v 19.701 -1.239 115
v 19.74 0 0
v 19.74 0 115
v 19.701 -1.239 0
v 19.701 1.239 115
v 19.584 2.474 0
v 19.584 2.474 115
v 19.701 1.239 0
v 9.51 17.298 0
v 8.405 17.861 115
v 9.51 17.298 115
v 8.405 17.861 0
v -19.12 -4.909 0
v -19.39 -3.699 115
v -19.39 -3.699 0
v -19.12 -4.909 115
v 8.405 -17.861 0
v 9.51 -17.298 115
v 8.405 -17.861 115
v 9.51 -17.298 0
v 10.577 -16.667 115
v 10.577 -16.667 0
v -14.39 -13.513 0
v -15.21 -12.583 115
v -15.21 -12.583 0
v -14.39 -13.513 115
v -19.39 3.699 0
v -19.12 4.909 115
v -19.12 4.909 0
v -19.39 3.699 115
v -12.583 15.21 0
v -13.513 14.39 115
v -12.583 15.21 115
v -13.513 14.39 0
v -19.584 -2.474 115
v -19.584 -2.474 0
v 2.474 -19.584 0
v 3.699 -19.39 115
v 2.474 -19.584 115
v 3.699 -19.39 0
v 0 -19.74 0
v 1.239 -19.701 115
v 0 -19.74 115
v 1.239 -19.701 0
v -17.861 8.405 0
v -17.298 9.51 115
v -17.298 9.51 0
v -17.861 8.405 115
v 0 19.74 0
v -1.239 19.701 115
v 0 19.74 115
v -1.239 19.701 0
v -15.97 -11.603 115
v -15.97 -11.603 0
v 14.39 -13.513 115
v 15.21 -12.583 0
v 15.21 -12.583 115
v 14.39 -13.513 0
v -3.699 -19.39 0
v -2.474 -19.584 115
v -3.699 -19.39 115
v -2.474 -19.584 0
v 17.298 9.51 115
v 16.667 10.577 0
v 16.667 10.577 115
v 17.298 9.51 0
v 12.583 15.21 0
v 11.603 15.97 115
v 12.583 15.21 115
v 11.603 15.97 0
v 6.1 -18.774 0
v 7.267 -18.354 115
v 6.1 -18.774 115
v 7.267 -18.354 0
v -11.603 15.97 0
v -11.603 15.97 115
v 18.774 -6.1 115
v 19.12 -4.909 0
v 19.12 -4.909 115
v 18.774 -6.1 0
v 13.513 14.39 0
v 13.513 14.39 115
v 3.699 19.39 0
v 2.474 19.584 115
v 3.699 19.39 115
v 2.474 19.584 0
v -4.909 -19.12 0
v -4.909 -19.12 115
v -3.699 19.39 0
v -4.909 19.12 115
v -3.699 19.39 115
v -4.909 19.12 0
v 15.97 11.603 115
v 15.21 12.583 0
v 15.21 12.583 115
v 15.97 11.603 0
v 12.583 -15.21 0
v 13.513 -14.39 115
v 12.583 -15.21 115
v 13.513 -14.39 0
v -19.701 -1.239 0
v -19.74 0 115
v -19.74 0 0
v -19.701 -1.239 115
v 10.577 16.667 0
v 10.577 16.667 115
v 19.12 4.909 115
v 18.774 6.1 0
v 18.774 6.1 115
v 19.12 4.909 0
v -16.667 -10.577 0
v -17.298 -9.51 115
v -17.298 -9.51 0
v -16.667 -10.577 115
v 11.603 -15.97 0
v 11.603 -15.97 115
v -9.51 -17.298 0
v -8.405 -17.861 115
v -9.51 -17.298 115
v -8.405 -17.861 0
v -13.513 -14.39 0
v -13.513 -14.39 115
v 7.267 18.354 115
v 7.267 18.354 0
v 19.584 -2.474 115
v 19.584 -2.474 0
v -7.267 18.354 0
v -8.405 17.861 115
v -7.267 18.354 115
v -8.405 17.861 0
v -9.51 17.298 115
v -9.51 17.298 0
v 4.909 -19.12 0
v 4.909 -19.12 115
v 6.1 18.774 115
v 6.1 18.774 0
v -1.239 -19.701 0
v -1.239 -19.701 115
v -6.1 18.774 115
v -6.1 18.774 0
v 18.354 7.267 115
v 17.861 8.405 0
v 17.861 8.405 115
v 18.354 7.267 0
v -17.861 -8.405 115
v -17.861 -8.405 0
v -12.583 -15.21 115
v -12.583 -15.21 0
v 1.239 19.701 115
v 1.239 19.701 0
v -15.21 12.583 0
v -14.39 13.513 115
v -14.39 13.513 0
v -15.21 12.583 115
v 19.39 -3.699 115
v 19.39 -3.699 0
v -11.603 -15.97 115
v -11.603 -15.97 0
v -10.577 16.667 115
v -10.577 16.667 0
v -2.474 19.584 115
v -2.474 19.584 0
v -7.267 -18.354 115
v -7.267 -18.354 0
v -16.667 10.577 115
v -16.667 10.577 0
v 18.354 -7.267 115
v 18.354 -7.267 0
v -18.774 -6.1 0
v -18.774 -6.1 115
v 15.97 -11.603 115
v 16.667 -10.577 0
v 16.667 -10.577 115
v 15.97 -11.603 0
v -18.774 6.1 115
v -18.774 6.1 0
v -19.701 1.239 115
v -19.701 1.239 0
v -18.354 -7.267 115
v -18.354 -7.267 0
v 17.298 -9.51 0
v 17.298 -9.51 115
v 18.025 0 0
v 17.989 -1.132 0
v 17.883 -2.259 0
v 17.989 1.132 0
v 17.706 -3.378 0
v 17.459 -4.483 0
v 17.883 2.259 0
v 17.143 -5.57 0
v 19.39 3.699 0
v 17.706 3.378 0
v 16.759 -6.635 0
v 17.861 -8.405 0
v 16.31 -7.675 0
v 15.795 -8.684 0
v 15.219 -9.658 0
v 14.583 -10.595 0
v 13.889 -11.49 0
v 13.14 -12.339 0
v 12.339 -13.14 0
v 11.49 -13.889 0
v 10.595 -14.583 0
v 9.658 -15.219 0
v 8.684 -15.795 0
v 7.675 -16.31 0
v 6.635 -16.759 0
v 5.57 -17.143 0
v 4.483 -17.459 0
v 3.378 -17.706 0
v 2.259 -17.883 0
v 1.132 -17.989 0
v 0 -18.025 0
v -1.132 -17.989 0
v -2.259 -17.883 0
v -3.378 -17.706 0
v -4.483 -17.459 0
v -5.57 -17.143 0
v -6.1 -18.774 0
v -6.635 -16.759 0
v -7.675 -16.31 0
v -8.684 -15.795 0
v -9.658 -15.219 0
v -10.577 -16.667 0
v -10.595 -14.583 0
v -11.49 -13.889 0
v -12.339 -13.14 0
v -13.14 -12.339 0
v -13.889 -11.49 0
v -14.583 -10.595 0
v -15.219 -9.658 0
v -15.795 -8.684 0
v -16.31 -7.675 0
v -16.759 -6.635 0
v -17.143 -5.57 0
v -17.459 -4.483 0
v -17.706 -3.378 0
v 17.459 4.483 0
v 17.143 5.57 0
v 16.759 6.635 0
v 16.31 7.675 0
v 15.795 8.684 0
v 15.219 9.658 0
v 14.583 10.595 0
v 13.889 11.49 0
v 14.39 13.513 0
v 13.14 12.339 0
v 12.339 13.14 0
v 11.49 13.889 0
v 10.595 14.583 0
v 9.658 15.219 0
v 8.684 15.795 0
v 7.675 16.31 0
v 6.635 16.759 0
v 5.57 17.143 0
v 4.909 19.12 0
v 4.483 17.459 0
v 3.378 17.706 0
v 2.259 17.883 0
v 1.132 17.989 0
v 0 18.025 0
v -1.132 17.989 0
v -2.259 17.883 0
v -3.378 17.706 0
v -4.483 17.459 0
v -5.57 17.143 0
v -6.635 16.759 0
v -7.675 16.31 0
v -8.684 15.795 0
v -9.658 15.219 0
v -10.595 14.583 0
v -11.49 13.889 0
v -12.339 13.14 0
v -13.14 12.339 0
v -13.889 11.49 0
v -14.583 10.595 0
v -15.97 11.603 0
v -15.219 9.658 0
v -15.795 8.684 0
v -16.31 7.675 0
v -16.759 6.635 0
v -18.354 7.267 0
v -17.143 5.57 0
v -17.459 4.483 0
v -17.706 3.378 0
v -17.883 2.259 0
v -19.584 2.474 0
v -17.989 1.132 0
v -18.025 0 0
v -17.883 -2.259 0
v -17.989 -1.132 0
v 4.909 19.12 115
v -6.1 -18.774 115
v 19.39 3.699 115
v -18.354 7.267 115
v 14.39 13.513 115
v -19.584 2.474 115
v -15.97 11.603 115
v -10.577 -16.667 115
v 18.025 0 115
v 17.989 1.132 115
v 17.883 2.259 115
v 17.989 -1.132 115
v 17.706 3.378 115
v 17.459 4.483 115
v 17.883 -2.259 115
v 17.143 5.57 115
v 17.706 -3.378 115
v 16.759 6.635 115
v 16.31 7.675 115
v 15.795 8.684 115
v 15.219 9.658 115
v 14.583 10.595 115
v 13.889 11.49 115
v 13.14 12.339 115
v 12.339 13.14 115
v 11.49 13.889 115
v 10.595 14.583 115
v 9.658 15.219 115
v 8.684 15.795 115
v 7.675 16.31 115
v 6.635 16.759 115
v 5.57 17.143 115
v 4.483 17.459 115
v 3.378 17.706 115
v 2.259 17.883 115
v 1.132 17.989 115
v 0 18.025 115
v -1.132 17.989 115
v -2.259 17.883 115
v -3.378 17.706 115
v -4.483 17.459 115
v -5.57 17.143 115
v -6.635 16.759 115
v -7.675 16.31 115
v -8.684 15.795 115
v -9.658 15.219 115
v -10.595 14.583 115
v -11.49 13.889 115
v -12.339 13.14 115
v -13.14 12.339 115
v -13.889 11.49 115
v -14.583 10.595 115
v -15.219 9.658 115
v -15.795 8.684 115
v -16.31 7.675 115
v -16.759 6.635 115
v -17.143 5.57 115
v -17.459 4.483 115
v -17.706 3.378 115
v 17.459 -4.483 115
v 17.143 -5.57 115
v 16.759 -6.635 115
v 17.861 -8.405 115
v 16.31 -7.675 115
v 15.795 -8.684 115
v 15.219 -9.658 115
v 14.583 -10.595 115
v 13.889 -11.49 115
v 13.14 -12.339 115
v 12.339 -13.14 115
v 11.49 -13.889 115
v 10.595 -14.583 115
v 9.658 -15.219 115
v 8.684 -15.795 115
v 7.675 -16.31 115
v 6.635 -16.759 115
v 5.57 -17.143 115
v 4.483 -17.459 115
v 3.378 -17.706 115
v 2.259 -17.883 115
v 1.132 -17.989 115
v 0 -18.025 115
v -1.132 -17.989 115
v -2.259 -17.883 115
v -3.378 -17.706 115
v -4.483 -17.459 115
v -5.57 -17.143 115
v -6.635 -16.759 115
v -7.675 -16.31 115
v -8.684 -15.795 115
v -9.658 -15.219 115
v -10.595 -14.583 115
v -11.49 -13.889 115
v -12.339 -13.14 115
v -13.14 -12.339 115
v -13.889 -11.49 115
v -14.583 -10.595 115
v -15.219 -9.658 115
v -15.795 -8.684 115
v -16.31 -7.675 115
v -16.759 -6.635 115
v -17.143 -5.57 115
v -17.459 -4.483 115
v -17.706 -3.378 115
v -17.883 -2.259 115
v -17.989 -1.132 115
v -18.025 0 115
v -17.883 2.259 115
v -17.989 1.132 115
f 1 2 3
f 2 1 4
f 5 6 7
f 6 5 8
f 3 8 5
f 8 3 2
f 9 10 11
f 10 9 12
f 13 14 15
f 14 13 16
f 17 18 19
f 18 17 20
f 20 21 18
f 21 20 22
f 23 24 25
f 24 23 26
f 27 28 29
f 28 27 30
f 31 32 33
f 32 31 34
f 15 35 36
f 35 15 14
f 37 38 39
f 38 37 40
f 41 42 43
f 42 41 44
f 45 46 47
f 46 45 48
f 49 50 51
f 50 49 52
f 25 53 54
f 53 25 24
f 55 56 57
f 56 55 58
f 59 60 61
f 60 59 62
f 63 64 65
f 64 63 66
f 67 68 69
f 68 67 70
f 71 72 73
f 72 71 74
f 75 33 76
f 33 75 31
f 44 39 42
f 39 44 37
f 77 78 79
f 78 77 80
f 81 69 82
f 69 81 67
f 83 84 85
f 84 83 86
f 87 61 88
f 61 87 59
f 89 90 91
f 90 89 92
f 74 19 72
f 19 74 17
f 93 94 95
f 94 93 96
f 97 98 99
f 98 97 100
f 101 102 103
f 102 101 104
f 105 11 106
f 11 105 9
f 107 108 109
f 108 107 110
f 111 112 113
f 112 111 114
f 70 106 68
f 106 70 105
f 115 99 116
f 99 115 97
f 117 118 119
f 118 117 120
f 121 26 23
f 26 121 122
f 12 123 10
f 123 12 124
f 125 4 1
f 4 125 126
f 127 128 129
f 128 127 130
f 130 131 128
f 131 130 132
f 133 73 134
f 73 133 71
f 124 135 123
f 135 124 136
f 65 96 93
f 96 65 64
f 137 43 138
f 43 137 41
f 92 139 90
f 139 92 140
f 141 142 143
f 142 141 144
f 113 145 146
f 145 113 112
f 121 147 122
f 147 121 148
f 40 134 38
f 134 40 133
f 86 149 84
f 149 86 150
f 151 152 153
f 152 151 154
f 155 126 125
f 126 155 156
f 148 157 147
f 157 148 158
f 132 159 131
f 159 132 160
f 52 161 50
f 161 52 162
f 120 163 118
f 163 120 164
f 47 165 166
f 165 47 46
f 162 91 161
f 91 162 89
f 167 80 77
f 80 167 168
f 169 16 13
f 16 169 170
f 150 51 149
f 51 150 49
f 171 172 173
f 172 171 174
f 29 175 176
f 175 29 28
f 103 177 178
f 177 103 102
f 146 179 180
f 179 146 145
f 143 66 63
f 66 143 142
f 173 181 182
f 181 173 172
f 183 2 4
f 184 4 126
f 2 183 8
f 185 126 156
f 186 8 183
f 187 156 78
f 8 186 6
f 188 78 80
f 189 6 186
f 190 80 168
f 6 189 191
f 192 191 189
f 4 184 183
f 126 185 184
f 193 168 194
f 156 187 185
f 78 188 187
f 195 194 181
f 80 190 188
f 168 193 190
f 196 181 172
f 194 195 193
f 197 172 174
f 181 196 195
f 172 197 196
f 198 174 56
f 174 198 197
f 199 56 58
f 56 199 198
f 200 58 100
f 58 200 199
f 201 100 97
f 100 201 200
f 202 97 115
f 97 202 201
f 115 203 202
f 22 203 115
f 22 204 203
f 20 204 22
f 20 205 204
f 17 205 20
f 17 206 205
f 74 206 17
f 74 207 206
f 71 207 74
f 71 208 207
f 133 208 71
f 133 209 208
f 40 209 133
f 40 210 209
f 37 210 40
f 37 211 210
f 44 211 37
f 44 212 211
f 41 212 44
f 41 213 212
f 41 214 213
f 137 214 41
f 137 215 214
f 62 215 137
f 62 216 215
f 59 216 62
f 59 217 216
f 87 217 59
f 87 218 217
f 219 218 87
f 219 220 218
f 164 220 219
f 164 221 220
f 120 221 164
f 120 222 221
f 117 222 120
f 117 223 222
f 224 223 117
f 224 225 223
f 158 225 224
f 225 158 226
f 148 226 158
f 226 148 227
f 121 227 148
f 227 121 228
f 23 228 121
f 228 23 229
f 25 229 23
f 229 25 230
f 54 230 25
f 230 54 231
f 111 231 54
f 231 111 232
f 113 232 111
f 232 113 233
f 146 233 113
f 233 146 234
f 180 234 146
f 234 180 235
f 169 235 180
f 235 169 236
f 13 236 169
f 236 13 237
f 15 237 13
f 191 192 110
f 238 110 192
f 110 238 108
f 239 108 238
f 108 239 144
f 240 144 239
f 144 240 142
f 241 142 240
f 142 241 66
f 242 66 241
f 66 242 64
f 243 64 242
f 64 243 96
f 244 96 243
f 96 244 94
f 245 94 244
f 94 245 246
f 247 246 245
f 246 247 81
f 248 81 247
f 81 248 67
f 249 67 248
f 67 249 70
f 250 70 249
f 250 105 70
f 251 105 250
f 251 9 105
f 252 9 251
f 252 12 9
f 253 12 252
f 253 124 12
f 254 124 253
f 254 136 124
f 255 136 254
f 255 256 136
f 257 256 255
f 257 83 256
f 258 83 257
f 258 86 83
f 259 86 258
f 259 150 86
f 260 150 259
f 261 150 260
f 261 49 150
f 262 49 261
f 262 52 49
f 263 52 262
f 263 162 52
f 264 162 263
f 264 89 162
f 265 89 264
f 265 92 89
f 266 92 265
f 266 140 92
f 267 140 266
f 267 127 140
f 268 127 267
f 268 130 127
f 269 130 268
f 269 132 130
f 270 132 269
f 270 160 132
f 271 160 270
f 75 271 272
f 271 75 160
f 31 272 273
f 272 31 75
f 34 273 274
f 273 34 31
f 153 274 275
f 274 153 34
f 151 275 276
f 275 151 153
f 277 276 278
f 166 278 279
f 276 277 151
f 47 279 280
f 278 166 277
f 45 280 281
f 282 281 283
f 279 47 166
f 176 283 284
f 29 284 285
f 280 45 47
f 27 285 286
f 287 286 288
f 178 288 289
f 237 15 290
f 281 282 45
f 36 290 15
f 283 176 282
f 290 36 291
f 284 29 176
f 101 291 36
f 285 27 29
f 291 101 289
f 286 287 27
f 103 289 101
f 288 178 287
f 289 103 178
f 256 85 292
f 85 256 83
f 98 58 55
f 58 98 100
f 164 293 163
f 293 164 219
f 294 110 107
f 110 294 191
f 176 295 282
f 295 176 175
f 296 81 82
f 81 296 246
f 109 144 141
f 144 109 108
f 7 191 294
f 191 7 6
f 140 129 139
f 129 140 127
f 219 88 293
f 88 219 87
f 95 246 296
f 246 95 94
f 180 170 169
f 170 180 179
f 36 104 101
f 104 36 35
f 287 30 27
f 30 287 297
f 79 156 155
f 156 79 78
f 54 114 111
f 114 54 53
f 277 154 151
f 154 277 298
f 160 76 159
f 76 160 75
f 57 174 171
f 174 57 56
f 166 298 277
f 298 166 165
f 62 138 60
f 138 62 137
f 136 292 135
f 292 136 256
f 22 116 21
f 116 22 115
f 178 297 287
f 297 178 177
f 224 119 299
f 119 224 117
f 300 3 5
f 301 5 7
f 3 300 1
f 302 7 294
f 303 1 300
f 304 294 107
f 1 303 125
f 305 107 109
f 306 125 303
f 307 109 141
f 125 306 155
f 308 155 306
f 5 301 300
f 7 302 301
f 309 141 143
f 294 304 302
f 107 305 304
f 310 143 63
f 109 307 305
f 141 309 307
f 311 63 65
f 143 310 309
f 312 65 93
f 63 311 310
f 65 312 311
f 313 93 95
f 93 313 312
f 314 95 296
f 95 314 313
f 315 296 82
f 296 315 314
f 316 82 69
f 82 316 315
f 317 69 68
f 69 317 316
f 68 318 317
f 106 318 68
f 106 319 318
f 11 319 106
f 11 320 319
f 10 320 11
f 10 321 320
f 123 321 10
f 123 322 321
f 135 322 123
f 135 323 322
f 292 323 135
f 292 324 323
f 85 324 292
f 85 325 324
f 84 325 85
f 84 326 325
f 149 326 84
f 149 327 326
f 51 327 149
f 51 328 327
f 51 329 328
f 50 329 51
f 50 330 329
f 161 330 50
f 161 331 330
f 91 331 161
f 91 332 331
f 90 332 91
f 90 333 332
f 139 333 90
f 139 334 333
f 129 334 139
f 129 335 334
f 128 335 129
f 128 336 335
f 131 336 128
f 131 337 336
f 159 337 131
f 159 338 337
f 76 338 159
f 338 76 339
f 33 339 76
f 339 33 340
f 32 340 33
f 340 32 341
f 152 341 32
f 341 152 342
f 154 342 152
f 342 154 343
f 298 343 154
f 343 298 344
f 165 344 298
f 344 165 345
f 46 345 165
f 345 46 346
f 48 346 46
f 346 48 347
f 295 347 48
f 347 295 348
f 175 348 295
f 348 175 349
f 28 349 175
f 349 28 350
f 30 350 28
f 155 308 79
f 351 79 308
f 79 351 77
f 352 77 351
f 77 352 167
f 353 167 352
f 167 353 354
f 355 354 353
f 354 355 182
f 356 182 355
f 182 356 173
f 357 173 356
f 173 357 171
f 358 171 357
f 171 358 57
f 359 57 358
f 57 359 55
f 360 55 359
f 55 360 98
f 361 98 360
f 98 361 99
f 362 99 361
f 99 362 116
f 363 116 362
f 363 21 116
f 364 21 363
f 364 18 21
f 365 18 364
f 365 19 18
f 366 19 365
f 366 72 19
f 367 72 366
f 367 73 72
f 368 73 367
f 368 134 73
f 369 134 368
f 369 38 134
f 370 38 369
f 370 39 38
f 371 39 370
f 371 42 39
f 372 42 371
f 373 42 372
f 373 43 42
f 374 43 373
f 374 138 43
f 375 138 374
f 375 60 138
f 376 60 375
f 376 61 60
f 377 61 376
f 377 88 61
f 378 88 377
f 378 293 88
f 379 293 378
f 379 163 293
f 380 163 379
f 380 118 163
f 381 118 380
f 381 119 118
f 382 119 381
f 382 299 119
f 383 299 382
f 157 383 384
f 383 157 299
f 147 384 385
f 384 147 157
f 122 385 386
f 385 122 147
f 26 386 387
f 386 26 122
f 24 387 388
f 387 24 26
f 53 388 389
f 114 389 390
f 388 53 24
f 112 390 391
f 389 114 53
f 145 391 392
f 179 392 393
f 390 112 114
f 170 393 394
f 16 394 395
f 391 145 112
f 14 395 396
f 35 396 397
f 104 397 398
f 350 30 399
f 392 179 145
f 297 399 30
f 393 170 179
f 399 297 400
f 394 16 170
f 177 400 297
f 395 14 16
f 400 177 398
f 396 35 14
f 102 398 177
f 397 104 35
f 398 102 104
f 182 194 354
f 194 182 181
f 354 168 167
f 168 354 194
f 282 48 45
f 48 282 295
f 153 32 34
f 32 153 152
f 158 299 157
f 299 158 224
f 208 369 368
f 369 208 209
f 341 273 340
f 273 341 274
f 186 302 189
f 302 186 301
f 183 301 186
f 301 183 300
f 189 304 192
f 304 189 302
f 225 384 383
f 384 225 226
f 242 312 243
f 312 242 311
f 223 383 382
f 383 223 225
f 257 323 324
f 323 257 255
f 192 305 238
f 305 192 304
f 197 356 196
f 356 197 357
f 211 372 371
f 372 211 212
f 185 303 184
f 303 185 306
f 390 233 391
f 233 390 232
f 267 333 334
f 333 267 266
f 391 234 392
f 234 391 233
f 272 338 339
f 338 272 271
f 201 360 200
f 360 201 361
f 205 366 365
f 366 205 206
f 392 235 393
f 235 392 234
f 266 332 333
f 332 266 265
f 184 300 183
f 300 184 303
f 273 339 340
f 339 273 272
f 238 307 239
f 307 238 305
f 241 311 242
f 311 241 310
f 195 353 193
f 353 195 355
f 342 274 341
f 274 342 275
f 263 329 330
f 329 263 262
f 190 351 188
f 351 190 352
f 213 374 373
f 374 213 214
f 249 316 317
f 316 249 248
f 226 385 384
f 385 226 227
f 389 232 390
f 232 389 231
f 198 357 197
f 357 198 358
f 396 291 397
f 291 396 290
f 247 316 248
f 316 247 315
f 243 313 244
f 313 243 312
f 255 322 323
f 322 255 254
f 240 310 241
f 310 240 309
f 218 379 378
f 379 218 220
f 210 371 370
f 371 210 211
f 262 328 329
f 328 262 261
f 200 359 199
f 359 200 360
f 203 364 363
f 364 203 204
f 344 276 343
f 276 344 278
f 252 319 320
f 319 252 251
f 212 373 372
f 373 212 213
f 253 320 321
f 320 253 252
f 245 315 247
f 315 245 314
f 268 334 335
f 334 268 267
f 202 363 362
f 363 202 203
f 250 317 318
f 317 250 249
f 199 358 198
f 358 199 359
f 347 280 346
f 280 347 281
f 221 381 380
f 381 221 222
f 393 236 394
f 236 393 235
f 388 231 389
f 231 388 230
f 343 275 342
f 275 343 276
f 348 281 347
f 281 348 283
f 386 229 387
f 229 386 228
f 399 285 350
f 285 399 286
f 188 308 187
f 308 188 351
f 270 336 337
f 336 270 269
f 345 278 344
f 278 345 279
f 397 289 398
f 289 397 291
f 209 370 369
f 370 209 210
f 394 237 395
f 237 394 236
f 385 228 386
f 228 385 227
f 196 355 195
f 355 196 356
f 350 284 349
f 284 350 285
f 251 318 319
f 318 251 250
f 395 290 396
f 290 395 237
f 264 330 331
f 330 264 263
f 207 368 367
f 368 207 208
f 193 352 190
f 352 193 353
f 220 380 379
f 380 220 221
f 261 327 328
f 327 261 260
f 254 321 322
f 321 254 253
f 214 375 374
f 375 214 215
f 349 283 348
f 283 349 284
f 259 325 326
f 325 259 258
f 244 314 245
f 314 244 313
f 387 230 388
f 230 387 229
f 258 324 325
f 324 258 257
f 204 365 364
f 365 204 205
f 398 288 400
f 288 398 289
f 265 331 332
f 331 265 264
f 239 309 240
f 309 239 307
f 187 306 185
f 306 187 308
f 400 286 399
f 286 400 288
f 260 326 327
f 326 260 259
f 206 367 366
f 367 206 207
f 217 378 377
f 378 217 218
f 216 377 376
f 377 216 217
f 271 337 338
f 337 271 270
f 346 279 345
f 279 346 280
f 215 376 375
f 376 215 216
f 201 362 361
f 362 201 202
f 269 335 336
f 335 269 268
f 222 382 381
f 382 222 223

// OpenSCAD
// Bog fitting

$fn = 100;

difference () {
    cylinder( r = 39.48 / 2.0, h = 115.0);
    cylinder( r = 36.05 / 2.0, h = 115.0);
}
